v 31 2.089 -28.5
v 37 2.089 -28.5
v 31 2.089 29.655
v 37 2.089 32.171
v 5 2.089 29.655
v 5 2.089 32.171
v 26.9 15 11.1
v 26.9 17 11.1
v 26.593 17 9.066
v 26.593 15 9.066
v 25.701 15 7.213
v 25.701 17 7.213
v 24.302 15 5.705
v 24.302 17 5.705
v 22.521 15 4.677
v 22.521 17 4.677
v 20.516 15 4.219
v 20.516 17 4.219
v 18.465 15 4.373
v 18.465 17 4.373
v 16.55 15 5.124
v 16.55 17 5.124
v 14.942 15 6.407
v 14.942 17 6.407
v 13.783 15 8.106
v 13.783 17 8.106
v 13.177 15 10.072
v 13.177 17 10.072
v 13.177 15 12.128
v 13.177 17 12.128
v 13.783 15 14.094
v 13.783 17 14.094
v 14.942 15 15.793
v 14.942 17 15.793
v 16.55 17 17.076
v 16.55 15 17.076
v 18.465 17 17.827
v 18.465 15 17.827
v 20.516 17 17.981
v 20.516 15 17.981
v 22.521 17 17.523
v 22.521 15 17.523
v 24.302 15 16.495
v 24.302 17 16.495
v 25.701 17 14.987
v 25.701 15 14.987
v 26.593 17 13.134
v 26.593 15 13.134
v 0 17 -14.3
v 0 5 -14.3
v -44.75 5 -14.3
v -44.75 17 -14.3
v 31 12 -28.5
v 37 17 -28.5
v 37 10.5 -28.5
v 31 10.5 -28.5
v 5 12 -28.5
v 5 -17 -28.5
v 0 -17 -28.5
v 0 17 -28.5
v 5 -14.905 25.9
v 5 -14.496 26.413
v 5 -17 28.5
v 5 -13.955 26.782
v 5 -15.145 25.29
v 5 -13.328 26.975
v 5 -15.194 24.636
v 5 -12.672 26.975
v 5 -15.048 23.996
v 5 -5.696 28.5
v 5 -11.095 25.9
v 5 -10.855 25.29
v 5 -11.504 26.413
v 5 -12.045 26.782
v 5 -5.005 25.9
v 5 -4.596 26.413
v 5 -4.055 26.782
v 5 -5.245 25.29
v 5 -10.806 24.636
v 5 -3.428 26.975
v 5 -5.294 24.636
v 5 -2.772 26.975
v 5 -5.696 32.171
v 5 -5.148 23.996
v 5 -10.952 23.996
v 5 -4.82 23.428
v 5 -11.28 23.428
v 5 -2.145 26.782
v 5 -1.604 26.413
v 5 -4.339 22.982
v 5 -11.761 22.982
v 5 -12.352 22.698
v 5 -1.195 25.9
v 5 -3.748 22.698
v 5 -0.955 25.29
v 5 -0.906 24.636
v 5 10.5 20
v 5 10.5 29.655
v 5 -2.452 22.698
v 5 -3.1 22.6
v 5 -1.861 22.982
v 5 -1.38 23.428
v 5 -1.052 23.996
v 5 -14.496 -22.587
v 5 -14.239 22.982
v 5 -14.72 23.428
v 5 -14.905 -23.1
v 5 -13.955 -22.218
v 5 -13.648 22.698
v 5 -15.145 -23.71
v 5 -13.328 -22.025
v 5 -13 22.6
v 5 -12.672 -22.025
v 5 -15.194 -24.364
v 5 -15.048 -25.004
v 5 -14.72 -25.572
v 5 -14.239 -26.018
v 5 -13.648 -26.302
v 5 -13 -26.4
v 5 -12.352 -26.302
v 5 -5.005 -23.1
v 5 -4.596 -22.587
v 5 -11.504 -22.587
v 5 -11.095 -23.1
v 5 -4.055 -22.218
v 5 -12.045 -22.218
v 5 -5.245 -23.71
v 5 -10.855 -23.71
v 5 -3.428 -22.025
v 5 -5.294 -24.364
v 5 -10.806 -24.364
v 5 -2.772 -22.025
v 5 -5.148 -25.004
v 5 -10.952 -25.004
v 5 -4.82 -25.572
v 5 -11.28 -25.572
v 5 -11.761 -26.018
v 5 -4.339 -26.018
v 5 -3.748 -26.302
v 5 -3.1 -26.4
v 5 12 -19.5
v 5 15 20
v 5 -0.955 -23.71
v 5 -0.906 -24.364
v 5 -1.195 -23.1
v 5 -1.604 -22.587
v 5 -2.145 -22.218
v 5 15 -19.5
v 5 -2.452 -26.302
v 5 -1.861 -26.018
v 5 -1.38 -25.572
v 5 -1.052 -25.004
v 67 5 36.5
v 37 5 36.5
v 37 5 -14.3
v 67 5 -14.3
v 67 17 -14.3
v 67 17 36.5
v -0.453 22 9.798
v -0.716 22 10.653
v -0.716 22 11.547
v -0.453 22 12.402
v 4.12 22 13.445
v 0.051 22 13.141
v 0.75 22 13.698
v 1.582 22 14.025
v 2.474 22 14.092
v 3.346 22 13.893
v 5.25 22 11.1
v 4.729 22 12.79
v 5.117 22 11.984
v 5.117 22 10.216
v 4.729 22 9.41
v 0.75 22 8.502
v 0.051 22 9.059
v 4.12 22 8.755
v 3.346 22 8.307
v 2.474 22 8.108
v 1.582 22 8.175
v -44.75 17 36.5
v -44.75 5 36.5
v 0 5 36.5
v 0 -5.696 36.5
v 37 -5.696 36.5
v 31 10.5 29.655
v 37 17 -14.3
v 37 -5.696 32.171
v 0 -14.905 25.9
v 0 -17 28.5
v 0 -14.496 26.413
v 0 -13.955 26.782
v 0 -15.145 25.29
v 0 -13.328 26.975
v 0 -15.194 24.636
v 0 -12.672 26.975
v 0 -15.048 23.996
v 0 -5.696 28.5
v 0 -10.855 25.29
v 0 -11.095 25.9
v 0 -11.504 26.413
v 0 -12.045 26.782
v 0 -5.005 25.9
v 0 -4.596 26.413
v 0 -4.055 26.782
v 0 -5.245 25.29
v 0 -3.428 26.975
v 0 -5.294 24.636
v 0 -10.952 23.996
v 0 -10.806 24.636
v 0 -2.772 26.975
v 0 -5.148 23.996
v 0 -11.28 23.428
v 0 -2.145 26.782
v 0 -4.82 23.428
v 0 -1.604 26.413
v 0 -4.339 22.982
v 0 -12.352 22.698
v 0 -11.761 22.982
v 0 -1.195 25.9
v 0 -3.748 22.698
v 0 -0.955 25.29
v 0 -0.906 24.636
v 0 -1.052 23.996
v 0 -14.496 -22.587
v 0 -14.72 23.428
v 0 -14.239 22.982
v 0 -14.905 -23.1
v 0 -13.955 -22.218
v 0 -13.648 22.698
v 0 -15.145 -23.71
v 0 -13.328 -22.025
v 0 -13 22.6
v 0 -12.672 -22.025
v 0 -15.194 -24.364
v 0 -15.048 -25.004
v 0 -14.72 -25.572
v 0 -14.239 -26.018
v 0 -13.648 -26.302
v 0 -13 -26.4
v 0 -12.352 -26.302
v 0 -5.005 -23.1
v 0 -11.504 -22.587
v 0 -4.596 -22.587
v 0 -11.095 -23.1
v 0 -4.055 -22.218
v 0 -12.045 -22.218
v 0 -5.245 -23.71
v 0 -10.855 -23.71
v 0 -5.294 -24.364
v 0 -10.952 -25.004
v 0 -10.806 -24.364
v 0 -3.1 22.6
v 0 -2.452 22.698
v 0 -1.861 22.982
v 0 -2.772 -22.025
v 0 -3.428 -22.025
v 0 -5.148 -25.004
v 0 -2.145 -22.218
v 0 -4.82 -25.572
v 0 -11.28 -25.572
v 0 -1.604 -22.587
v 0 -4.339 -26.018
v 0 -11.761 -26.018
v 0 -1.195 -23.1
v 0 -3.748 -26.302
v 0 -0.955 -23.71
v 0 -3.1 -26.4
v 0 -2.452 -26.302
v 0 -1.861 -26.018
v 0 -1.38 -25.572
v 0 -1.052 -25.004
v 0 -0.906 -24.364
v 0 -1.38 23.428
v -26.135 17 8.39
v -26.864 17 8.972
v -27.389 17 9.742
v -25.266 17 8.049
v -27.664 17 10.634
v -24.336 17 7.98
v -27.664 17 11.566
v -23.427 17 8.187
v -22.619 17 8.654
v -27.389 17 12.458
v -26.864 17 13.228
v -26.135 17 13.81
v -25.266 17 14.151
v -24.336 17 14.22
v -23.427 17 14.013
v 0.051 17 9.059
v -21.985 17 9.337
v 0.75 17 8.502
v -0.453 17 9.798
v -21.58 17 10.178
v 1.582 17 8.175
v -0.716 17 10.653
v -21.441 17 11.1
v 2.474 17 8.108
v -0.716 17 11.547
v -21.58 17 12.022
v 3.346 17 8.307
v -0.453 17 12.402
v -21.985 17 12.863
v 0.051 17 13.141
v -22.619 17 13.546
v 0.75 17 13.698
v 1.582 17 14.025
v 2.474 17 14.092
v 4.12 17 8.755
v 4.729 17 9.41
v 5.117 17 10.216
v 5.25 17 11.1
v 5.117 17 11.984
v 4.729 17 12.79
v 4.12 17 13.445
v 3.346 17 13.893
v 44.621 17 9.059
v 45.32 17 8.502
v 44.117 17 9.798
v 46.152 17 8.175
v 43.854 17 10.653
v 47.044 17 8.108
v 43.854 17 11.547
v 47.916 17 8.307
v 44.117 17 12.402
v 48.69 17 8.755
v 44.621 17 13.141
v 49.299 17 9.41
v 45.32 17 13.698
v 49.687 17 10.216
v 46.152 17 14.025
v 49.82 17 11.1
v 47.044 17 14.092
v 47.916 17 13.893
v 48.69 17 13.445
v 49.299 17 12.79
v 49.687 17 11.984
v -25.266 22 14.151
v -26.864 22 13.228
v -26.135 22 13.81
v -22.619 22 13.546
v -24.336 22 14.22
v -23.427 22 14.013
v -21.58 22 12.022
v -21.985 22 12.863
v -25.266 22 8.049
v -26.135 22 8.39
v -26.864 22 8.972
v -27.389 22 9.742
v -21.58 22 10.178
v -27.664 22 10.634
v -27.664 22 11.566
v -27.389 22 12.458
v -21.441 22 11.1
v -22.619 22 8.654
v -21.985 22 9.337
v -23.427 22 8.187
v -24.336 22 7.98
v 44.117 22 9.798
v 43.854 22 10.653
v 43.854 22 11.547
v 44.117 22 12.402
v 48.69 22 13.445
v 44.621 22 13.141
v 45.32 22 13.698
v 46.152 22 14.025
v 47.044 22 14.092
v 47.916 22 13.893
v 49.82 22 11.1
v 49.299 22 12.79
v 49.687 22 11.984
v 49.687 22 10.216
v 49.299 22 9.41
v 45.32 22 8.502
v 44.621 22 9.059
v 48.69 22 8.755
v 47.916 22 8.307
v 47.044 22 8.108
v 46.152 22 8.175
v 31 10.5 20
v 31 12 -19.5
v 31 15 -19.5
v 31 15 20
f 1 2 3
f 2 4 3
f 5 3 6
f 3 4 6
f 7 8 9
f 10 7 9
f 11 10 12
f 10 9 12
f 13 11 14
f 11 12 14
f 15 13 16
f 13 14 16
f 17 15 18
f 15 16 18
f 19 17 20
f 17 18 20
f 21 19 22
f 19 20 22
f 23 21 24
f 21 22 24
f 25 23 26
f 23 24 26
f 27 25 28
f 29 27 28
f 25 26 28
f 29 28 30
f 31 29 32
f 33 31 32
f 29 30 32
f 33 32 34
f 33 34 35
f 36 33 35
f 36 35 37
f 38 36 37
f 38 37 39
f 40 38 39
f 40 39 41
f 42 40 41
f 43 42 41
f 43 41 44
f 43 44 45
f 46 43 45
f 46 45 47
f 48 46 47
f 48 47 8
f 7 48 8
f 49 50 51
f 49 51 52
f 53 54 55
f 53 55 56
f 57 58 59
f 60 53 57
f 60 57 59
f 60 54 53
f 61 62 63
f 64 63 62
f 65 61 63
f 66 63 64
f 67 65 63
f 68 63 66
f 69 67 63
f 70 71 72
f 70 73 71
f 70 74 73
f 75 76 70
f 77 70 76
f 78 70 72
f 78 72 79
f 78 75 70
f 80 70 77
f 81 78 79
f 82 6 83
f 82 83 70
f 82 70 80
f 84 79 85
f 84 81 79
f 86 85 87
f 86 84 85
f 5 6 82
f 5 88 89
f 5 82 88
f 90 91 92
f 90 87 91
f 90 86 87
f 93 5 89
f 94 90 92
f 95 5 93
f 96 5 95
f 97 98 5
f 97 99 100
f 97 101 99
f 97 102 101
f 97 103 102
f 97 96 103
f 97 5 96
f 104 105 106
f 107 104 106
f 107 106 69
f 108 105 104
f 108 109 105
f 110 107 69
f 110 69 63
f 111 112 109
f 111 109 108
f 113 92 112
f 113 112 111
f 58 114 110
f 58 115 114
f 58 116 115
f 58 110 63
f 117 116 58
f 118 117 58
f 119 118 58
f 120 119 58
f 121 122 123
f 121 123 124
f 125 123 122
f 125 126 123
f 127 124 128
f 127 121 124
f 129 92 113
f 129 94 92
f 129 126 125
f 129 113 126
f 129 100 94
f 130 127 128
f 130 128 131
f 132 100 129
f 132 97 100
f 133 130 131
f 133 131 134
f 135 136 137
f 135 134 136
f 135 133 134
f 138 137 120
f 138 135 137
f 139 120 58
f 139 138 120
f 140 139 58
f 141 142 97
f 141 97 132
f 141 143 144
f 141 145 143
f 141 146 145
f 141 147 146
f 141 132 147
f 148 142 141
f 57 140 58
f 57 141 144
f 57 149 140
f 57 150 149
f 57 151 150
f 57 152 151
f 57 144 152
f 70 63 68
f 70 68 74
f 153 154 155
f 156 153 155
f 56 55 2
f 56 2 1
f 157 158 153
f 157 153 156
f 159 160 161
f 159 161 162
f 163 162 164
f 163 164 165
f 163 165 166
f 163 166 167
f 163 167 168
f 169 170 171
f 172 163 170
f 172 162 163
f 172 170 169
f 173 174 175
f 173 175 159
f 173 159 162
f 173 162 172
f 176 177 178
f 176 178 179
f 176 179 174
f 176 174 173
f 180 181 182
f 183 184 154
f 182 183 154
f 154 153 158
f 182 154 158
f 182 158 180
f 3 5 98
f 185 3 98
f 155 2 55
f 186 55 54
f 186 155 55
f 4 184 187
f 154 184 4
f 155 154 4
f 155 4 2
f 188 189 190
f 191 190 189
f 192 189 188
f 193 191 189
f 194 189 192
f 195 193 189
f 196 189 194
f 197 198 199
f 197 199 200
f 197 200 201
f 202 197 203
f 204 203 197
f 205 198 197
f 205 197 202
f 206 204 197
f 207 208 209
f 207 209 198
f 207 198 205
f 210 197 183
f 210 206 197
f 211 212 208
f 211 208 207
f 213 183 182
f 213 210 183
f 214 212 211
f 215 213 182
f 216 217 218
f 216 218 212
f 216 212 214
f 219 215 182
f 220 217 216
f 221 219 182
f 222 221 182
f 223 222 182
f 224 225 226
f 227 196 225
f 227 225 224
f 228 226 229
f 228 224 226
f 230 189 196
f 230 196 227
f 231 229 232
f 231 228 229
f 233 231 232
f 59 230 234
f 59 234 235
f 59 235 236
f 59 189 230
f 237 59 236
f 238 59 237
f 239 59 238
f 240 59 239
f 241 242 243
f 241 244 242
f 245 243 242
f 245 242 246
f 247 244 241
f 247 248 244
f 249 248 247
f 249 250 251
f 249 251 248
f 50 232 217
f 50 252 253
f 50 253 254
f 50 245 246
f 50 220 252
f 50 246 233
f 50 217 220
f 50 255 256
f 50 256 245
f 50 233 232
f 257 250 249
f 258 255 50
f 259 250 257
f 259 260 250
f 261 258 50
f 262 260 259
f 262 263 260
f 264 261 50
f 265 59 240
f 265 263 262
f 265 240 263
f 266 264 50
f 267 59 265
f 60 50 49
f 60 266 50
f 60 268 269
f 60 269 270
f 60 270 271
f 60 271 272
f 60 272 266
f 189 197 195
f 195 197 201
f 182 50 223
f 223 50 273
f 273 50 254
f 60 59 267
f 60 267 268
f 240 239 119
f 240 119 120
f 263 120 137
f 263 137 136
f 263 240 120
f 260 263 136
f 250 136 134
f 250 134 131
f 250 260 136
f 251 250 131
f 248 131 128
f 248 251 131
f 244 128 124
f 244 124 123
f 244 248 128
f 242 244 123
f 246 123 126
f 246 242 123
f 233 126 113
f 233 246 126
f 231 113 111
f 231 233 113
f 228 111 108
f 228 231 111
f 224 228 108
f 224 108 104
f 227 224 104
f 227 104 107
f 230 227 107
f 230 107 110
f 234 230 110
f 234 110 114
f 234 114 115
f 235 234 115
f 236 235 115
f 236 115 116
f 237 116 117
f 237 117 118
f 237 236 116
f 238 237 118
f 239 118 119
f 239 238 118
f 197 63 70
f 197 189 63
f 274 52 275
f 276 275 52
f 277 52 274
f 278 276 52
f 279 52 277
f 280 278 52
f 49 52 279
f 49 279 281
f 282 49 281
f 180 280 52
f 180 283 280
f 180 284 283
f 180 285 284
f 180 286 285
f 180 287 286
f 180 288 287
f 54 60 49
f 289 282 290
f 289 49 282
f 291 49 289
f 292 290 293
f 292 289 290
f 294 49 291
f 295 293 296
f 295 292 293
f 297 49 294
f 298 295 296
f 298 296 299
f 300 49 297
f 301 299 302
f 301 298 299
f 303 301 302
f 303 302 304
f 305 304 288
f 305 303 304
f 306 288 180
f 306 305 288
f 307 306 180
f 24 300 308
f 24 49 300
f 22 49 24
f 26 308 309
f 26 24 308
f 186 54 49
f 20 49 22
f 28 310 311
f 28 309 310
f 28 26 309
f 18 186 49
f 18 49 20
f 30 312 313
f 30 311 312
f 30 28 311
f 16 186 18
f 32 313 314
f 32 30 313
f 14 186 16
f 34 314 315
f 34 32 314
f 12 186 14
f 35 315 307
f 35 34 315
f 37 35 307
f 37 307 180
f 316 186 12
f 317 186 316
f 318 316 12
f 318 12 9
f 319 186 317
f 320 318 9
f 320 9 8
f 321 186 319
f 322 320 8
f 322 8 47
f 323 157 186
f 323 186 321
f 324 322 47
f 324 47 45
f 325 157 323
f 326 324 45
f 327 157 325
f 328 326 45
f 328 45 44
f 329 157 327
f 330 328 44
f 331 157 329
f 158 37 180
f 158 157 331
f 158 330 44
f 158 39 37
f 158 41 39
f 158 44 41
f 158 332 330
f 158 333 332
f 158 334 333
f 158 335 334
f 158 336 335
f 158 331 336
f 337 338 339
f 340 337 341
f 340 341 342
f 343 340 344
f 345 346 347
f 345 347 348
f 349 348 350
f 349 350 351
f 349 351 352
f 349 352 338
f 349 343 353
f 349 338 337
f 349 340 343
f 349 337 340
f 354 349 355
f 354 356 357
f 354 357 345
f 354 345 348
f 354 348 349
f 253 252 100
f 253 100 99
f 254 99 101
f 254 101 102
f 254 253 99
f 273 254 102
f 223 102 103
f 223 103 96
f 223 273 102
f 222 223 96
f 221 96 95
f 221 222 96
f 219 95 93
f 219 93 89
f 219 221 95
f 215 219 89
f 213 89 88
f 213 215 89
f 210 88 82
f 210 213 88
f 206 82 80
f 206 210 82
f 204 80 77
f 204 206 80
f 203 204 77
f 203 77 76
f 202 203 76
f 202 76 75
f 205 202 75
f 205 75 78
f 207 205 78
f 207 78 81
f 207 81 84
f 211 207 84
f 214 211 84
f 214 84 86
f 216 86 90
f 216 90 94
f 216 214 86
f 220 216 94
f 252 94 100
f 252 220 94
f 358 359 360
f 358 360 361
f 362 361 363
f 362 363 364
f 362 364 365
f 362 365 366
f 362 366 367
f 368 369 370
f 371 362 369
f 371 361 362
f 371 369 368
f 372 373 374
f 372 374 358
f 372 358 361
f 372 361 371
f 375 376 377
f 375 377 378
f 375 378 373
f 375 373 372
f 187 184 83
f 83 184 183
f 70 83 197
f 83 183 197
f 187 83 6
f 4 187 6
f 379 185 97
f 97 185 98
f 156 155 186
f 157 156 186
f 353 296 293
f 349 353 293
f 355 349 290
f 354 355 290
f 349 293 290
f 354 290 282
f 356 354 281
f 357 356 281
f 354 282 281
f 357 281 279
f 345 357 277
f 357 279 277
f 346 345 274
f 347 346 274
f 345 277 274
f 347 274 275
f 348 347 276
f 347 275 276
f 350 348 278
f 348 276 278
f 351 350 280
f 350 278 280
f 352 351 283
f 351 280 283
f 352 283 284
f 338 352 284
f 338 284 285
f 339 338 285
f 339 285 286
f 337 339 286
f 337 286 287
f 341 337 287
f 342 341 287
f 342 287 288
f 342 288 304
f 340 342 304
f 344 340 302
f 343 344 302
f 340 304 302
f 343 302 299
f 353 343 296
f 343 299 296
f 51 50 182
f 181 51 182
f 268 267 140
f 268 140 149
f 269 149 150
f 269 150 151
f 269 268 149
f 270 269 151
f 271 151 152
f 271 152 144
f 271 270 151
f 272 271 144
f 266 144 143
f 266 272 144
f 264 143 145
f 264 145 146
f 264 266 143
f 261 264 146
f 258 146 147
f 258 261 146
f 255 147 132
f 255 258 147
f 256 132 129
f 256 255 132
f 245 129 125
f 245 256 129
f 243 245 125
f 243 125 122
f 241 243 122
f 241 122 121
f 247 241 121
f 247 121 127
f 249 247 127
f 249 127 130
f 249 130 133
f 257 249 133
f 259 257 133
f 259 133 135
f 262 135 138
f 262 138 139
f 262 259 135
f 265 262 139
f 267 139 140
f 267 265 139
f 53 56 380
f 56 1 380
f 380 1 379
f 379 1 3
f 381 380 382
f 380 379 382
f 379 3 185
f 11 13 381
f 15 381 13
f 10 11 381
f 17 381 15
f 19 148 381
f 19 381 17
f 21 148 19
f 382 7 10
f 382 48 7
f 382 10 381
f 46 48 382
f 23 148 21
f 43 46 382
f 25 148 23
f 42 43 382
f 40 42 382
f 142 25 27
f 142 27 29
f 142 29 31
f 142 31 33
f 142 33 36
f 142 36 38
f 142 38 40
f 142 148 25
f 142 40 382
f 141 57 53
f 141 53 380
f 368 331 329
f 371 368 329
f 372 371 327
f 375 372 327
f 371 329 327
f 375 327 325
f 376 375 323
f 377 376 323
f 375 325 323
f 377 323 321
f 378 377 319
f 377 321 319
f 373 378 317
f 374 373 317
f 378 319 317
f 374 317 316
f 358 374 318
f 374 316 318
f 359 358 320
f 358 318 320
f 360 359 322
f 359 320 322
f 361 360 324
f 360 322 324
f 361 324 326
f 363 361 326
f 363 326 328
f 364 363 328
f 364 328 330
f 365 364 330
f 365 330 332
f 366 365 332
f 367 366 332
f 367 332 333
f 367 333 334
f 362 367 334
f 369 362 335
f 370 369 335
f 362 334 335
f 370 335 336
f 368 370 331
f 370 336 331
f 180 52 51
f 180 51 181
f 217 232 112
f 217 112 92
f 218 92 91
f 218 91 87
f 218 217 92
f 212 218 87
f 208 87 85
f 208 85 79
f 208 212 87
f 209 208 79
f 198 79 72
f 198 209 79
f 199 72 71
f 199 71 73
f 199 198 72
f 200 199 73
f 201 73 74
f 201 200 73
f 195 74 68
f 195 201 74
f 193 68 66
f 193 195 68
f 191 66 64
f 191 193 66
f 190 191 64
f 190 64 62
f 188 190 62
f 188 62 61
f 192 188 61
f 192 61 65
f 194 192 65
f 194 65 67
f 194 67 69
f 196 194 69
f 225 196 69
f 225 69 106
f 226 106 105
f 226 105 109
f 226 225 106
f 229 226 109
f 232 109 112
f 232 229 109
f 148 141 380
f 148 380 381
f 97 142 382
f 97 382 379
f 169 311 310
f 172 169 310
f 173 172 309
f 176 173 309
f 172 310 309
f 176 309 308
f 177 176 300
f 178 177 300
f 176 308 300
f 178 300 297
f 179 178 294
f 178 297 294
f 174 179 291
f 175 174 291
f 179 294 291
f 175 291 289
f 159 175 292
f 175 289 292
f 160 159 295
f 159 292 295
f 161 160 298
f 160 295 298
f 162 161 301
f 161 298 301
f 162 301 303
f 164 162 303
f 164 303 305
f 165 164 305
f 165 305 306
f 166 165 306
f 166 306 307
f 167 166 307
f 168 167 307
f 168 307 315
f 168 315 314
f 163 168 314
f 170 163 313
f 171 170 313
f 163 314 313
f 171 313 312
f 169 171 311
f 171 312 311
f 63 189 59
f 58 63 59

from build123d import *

# Parameters (mm, degrees)
SKETCH3_W            = 57
SKETCH3_H            = 34
SKETCH3_R            = 2.2
BOSS_EXTRUDE2_DEPTH  = 5
BOSS_EXTRUDE3_DEPTH  = 32
SKETCH5_R            = 6.9
CUT_EXTRUDE1_DEPTH   = 19
BOSS_EXTRUDE4_DEPTH  = 8
SKETCH7_W            = 6
SKETCH7_H            = 4.5
BOSS_EXTRUDE5_DEPTH  = 39.5
BOSS_EXTRUDE6_DEPTH  = 32
BOSS_EXTRUDE7_DEPTH  = 32
SKETCH11_W           = 6
SKETCH11_H           = 8.410531804
BOSS_EXTRUDE8_DEPTH  = 58.155109
SKETCH12_W           = 6
SKETCH12_H           = 1.5
BOSS_EXTRUDE9_DEPTH  = 9
SKETCH13_W           = 50.8
SKETCH13_H           = 12
BOSS_EXTRUDE10_DEPTH = 30
SKETCH14_W           = 50.8
SKETCH14_H           = 12
BOSS_EXTRUDE11_DEPTH = 44.75
SKETCH15_R           = 3
SKETCH15_R_2         = 3.129089935
BOSS_EXTRUDE12_DEPTH = 5


with BuildPart() as part:
    # Sketch3 → Boss-Extrude2 (new body)
    with BuildSketch(Plane(origin=(0, 0, 0), x_dir=(0, 0, -1), z_dir=(1, 0, 0))):
        Rectangle(SKETCH3_W, SKETCH3_H)
        with Locations((-24.8, -3.1)):
            Circle(SKETCH3_R, mode=Mode.SUBTRACT)
        with Locations((-24.8, -13)):
            Circle(SKETCH3_R, mode=Mode.SUBTRACT)
        with Locations((24.2, -3.1)):
            Circle(SKETCH3_R, mode=Mode.SUBTRACT)
        with Locations((24.2, -13)):
            Circle(SKETCH3_R, mode=Mode.SUBTRACT)
    extrude(amount=BOSS_EXTRUDE2_DEPTH)

    # Sketch4 → Boss-Extrude3 (add)
    with BuildSketch(Plane(origin=(5, 0, 0), x_dir=(0, 0, -1), z_dir=(1, 0, 0))):
        Polygon((-28.5, 17), (12, 17), (12, 15), (-20, 15), (-20, 10.5), (-28.5, 10.5), align=None)
    extrude(amount=BOSS_EXTRUDE3_DEPTH)

    # Sketch5 → Cut-Extrude1 (cut)
    with BuildSketch(Plane(origin=(0, 17, 0), x_dir=(1, 0, 0), z_dir=(0, 1, 0))):
        with Locations((20, -11.1)):
            Circle(SKETCH5_R)
    extrude(amount=-CUT_EXTRUDE1_DEPTH, mode=Mode.SUBTRACT)

    # Sketch6 → Boss-Extrude4 (add)
    with BuildSketch(Plane.XY.offset(28.5)):
        Polygon((0, 17), (37, 17), (37, 10.5), (5, 10.5), (5, -5.696050601), (0, -5.696050601), align=None)
    extrude(amount=BOSS_EXTRUDE4_DEPTH)

    # Sketch7 → Boss-Extrude5 (add)
    with BuildSketch(Plane(origin=(0, 0, 20), x_dir=(-1, 0, 0), z_dir=(0, 0, -1))):
        with Locations((-34, 12.75)):
            Rectangle(SKETCH7_W, SKETCH7_H)
    extrude(amount=BOSS_EXTRUDE5_DEPTH)

    # Sketch8 → Boss-Extrude6 (add)
    with BuildSketch(Plane(origin=(5, 0, 0), x_dir=(0, 0, -1), z_dir=(1, 0, 0))):
        Polygon((-36.5, -5.696050601), (-32.171374704, -5.696050601), (-32.171374704, 2.089468196), (-29.655108528, 2.089468196), (-29.655108528, 10.5), (-32.171374704, 10.5), (-36.5, 10.5), align=None)
    extrude(amount=BOSS_EXTRUDE6_DEPTH)

    # Sketch9 → Boss-Extrude7 (add)
    with BuildSketch(Plane(origin=(5, 0, 0), x_dir=(0, 0, -1), z_dir=(1, 0, 0))):
        Polygon((12, 17), (28.5, 17), (28.5, 12), (19.5, 12), (19.5, 15), (12, 15), align=None)
    extrude(amount=BOSS_EXTRUDE7_DEPTH)

    # Sketch11 → Boss-Extrude8 (add)
    with BuildSketch(Plane(origin=(0, 0, 29.655108528), x_dir=(-1, 0, 0), z_dir=(0, 0, -1))):
        with Locations((-34, 6.294734098)):
            Rectangle(SKETCH11_W, SKETCH11_H)
    extrude(amount=BOSS_EXTRUDE8_DEPTH)

    # Sketch12 → Boss-Extrude9 (add)
    with BuildSketch(Plane(origin=(0, 0, -19.5), x_dir=(-1, 0, 0), z_dir=(0, 0, -1))):
        with Locations((-34, 11.25)):
            Rectangle(SKETCH12_W, SKETCH12_H)
    extrude(amount=BOSS_EXTRUDE9_DEPTH)

    # Sketch13 → Boss-Extrude10 (add)
    with BuildSketch(Plane(origin=(37, 0, 0), x_dir=(0, 0, -1), z_dir=(1, 0, 0))):
        with Locations((-11.1, 11)):
            Rectangle(SKETCH13_W, SKETCH13_H)
    extrude(amount=BOSS_EXTRUDE10_DEPTH)

    # Sketch14 → Boss-Extrude11 (add)
    with BuildSketch(Plane.ZY):
        with Locations((11.1, 11)):
            Rectangle(SKETCH14_W, SKETCH14_H)
    extrude(amount=BOSS_EXTRUDE11_DEPTH)

    # Sketch15 → Boss-Extrude12 (add)
    with BuildSketch(Plane(origin=(0, 17, 0), x_dir=(1, 0, 0), z_dir=(0, 1, 0))):
        with Locations((2.25, -11.1)):
            Circle(SKETCH15_R)
        with Locations((46.82, -11.1)):
            Circle(SKETCH15_R)
        with Locations((-24.57, -11.1)):
            Circle(SKETCH15_R_2)
    extrude(amount=BOSS_EXTRUDE12_DEPTH)


solid = part.part
